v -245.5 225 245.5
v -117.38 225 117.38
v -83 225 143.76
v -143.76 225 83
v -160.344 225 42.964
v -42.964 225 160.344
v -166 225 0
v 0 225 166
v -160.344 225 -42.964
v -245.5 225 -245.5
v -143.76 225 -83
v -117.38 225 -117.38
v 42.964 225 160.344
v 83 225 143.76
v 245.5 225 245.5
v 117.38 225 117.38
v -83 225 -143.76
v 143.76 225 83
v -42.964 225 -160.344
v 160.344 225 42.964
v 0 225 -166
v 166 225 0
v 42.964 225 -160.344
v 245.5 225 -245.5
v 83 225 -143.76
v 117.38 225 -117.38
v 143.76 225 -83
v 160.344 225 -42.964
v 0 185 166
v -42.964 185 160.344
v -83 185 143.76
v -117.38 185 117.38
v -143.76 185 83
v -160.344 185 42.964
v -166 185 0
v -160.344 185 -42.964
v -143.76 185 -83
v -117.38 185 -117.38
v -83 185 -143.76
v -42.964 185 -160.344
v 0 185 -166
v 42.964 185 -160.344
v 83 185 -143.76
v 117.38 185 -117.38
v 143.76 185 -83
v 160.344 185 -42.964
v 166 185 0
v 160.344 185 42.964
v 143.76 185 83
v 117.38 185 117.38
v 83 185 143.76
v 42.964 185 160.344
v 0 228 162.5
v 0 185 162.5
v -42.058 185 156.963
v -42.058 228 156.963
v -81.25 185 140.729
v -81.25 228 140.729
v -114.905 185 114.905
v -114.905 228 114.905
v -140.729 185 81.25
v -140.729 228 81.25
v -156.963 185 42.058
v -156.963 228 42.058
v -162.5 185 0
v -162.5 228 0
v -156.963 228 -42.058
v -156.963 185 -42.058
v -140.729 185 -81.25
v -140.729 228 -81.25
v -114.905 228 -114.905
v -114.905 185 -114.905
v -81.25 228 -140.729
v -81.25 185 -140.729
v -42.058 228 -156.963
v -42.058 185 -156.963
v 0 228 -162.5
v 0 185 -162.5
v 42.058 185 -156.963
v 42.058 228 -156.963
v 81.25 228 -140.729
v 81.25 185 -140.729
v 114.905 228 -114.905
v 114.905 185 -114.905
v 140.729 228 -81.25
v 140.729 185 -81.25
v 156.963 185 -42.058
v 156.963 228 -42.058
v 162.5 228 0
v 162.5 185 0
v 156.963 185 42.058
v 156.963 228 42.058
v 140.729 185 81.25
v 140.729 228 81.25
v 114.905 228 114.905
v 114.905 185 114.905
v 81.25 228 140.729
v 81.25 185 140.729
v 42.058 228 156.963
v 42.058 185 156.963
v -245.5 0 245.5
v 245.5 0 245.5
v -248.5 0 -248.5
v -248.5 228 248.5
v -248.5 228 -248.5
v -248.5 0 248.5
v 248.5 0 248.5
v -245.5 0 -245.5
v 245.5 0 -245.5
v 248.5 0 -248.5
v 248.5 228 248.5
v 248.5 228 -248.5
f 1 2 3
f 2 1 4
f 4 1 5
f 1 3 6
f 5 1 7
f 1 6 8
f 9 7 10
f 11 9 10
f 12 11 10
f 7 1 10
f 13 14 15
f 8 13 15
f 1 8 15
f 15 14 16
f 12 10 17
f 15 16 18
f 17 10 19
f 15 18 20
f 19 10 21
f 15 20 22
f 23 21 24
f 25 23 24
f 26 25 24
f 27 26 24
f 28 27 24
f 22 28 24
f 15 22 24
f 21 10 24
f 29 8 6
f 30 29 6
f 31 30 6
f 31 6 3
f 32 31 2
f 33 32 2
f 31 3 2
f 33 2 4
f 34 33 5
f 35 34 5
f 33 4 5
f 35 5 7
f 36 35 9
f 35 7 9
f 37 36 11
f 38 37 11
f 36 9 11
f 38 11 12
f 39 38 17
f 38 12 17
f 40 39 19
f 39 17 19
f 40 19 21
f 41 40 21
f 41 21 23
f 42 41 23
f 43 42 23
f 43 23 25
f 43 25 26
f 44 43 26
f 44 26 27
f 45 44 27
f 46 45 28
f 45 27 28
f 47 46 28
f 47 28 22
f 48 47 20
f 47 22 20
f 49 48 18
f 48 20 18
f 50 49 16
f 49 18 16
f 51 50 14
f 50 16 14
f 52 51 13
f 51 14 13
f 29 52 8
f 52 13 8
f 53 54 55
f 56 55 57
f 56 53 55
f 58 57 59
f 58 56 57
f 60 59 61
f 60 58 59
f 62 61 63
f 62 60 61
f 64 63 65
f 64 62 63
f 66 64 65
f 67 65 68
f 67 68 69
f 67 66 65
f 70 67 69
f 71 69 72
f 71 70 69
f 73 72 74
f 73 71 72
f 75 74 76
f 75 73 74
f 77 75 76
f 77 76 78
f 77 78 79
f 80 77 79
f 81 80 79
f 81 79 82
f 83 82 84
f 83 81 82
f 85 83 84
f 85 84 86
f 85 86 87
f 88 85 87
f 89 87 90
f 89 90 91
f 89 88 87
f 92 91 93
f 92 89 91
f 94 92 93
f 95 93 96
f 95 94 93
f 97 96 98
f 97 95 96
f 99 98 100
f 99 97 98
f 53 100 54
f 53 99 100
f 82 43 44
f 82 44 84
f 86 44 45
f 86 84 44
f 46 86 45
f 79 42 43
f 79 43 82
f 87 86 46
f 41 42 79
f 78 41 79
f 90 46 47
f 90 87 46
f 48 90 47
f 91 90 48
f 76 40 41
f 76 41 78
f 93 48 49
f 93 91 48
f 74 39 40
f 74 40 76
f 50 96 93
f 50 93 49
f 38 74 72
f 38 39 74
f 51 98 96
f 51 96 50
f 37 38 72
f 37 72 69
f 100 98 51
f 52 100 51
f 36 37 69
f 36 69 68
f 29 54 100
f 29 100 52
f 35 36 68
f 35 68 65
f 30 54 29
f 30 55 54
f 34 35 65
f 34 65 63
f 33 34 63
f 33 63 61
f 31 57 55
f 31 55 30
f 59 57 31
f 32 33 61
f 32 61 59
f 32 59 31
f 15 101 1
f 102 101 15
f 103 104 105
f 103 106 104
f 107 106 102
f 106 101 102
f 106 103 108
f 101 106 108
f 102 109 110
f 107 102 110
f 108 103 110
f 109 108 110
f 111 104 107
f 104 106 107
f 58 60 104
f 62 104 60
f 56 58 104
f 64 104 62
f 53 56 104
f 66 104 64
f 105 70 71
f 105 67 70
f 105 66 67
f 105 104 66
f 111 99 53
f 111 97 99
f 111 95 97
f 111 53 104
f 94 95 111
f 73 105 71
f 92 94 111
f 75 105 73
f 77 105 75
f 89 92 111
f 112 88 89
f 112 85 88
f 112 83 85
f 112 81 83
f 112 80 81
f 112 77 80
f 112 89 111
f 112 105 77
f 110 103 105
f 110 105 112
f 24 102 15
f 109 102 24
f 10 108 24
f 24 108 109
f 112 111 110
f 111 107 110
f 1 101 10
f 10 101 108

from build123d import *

# Parameters (mm, degrees)
SKETCH1_W           = 497
SKETCH1_H           = 497
SKETCH1_W_2         = 491
SKETCH1_H_2         = 491
BOSS_EXTRUDE1_DEPTH = 225
SKETCH2_W           = 497
SKETCH2_H           = 497
BOSS_EXTRUDE2_DEPTH = 3
CUT_EXTRUDE1_REACH  = 420.913
SKETCH3_R           = 162.5
SKETCH4_R           = 166
SKETCH4_R_2         = 162.5
BOSS_EXTRUDE3_DEPTH = 40


with BuildPart() as part:
    # Sketch1 → Boss-Extrude1 (new body)
    with BuildSketch(Plane(origin=(0, 0, 0), x_dir=(1, 0, 0), z_dir=(0, 1, 0))):
        Rectangle(SKETCH1_W, SKETCH1_H)
        Rectangle(SKETCH1_W_2, SKETCH1_H_2, mode=Mode.SUBTRACT)
    extrude(amount=BOSS_EXTRUDE1_DEPTH)

    # Sketch2 → Boss-Extrude2 (add)
    with BuildSketch(Plane(origin=(0, 225, 0), x_dir=(1, 0, 0), z_dir=(0, 1, 0))):
        Rectangle(SKETCH2_W, SKETCH2_H)
    extrude(amount=BOSS_EXTRUDE2_DEPTH)

    # Sketch3 → Cut-Extrude1 (cut, up to next)
    with BuildSketch(Plane(origin=(0, 228, 0), x_dir=(1, 0, 0), z_dir=(0, 1, 0)), mode=Mode.PRIVATE) as cut_extrude1_sk1:
        with Locations(Location((0, 0, 0), (0, 0, 270))):
            Circle(SKETCH3_R)
    cut_extrude1_tool1 = extrude(cut_extrude1_sk1.sketch, amount=-CUT_EXTRUDE1_REACH, mode=Mode.PRIVATE) & part.part
    add(cut_extrude1_tool1.solids().sort_by_distance((0, 228, 0))[0], mode=Mode.SUBTRACT)

    # Sketch4 → Boss-Extrude3 (add)
    with BuildSketch(Plane.XZ.offset(-225)):
        with Locations(Location((0, 0, 0), (0, 0, 90))):
            Circle(SKETCH4_R)
        with Locations(Location((0, 0, 0), (0, 0, 90))):
            Circle(SKETCH4_R_2, mode=Mode.SUBTRACT)
    extrude(amount=BOSS_EXTRUDE3_DEPTH)


solid = part.part
